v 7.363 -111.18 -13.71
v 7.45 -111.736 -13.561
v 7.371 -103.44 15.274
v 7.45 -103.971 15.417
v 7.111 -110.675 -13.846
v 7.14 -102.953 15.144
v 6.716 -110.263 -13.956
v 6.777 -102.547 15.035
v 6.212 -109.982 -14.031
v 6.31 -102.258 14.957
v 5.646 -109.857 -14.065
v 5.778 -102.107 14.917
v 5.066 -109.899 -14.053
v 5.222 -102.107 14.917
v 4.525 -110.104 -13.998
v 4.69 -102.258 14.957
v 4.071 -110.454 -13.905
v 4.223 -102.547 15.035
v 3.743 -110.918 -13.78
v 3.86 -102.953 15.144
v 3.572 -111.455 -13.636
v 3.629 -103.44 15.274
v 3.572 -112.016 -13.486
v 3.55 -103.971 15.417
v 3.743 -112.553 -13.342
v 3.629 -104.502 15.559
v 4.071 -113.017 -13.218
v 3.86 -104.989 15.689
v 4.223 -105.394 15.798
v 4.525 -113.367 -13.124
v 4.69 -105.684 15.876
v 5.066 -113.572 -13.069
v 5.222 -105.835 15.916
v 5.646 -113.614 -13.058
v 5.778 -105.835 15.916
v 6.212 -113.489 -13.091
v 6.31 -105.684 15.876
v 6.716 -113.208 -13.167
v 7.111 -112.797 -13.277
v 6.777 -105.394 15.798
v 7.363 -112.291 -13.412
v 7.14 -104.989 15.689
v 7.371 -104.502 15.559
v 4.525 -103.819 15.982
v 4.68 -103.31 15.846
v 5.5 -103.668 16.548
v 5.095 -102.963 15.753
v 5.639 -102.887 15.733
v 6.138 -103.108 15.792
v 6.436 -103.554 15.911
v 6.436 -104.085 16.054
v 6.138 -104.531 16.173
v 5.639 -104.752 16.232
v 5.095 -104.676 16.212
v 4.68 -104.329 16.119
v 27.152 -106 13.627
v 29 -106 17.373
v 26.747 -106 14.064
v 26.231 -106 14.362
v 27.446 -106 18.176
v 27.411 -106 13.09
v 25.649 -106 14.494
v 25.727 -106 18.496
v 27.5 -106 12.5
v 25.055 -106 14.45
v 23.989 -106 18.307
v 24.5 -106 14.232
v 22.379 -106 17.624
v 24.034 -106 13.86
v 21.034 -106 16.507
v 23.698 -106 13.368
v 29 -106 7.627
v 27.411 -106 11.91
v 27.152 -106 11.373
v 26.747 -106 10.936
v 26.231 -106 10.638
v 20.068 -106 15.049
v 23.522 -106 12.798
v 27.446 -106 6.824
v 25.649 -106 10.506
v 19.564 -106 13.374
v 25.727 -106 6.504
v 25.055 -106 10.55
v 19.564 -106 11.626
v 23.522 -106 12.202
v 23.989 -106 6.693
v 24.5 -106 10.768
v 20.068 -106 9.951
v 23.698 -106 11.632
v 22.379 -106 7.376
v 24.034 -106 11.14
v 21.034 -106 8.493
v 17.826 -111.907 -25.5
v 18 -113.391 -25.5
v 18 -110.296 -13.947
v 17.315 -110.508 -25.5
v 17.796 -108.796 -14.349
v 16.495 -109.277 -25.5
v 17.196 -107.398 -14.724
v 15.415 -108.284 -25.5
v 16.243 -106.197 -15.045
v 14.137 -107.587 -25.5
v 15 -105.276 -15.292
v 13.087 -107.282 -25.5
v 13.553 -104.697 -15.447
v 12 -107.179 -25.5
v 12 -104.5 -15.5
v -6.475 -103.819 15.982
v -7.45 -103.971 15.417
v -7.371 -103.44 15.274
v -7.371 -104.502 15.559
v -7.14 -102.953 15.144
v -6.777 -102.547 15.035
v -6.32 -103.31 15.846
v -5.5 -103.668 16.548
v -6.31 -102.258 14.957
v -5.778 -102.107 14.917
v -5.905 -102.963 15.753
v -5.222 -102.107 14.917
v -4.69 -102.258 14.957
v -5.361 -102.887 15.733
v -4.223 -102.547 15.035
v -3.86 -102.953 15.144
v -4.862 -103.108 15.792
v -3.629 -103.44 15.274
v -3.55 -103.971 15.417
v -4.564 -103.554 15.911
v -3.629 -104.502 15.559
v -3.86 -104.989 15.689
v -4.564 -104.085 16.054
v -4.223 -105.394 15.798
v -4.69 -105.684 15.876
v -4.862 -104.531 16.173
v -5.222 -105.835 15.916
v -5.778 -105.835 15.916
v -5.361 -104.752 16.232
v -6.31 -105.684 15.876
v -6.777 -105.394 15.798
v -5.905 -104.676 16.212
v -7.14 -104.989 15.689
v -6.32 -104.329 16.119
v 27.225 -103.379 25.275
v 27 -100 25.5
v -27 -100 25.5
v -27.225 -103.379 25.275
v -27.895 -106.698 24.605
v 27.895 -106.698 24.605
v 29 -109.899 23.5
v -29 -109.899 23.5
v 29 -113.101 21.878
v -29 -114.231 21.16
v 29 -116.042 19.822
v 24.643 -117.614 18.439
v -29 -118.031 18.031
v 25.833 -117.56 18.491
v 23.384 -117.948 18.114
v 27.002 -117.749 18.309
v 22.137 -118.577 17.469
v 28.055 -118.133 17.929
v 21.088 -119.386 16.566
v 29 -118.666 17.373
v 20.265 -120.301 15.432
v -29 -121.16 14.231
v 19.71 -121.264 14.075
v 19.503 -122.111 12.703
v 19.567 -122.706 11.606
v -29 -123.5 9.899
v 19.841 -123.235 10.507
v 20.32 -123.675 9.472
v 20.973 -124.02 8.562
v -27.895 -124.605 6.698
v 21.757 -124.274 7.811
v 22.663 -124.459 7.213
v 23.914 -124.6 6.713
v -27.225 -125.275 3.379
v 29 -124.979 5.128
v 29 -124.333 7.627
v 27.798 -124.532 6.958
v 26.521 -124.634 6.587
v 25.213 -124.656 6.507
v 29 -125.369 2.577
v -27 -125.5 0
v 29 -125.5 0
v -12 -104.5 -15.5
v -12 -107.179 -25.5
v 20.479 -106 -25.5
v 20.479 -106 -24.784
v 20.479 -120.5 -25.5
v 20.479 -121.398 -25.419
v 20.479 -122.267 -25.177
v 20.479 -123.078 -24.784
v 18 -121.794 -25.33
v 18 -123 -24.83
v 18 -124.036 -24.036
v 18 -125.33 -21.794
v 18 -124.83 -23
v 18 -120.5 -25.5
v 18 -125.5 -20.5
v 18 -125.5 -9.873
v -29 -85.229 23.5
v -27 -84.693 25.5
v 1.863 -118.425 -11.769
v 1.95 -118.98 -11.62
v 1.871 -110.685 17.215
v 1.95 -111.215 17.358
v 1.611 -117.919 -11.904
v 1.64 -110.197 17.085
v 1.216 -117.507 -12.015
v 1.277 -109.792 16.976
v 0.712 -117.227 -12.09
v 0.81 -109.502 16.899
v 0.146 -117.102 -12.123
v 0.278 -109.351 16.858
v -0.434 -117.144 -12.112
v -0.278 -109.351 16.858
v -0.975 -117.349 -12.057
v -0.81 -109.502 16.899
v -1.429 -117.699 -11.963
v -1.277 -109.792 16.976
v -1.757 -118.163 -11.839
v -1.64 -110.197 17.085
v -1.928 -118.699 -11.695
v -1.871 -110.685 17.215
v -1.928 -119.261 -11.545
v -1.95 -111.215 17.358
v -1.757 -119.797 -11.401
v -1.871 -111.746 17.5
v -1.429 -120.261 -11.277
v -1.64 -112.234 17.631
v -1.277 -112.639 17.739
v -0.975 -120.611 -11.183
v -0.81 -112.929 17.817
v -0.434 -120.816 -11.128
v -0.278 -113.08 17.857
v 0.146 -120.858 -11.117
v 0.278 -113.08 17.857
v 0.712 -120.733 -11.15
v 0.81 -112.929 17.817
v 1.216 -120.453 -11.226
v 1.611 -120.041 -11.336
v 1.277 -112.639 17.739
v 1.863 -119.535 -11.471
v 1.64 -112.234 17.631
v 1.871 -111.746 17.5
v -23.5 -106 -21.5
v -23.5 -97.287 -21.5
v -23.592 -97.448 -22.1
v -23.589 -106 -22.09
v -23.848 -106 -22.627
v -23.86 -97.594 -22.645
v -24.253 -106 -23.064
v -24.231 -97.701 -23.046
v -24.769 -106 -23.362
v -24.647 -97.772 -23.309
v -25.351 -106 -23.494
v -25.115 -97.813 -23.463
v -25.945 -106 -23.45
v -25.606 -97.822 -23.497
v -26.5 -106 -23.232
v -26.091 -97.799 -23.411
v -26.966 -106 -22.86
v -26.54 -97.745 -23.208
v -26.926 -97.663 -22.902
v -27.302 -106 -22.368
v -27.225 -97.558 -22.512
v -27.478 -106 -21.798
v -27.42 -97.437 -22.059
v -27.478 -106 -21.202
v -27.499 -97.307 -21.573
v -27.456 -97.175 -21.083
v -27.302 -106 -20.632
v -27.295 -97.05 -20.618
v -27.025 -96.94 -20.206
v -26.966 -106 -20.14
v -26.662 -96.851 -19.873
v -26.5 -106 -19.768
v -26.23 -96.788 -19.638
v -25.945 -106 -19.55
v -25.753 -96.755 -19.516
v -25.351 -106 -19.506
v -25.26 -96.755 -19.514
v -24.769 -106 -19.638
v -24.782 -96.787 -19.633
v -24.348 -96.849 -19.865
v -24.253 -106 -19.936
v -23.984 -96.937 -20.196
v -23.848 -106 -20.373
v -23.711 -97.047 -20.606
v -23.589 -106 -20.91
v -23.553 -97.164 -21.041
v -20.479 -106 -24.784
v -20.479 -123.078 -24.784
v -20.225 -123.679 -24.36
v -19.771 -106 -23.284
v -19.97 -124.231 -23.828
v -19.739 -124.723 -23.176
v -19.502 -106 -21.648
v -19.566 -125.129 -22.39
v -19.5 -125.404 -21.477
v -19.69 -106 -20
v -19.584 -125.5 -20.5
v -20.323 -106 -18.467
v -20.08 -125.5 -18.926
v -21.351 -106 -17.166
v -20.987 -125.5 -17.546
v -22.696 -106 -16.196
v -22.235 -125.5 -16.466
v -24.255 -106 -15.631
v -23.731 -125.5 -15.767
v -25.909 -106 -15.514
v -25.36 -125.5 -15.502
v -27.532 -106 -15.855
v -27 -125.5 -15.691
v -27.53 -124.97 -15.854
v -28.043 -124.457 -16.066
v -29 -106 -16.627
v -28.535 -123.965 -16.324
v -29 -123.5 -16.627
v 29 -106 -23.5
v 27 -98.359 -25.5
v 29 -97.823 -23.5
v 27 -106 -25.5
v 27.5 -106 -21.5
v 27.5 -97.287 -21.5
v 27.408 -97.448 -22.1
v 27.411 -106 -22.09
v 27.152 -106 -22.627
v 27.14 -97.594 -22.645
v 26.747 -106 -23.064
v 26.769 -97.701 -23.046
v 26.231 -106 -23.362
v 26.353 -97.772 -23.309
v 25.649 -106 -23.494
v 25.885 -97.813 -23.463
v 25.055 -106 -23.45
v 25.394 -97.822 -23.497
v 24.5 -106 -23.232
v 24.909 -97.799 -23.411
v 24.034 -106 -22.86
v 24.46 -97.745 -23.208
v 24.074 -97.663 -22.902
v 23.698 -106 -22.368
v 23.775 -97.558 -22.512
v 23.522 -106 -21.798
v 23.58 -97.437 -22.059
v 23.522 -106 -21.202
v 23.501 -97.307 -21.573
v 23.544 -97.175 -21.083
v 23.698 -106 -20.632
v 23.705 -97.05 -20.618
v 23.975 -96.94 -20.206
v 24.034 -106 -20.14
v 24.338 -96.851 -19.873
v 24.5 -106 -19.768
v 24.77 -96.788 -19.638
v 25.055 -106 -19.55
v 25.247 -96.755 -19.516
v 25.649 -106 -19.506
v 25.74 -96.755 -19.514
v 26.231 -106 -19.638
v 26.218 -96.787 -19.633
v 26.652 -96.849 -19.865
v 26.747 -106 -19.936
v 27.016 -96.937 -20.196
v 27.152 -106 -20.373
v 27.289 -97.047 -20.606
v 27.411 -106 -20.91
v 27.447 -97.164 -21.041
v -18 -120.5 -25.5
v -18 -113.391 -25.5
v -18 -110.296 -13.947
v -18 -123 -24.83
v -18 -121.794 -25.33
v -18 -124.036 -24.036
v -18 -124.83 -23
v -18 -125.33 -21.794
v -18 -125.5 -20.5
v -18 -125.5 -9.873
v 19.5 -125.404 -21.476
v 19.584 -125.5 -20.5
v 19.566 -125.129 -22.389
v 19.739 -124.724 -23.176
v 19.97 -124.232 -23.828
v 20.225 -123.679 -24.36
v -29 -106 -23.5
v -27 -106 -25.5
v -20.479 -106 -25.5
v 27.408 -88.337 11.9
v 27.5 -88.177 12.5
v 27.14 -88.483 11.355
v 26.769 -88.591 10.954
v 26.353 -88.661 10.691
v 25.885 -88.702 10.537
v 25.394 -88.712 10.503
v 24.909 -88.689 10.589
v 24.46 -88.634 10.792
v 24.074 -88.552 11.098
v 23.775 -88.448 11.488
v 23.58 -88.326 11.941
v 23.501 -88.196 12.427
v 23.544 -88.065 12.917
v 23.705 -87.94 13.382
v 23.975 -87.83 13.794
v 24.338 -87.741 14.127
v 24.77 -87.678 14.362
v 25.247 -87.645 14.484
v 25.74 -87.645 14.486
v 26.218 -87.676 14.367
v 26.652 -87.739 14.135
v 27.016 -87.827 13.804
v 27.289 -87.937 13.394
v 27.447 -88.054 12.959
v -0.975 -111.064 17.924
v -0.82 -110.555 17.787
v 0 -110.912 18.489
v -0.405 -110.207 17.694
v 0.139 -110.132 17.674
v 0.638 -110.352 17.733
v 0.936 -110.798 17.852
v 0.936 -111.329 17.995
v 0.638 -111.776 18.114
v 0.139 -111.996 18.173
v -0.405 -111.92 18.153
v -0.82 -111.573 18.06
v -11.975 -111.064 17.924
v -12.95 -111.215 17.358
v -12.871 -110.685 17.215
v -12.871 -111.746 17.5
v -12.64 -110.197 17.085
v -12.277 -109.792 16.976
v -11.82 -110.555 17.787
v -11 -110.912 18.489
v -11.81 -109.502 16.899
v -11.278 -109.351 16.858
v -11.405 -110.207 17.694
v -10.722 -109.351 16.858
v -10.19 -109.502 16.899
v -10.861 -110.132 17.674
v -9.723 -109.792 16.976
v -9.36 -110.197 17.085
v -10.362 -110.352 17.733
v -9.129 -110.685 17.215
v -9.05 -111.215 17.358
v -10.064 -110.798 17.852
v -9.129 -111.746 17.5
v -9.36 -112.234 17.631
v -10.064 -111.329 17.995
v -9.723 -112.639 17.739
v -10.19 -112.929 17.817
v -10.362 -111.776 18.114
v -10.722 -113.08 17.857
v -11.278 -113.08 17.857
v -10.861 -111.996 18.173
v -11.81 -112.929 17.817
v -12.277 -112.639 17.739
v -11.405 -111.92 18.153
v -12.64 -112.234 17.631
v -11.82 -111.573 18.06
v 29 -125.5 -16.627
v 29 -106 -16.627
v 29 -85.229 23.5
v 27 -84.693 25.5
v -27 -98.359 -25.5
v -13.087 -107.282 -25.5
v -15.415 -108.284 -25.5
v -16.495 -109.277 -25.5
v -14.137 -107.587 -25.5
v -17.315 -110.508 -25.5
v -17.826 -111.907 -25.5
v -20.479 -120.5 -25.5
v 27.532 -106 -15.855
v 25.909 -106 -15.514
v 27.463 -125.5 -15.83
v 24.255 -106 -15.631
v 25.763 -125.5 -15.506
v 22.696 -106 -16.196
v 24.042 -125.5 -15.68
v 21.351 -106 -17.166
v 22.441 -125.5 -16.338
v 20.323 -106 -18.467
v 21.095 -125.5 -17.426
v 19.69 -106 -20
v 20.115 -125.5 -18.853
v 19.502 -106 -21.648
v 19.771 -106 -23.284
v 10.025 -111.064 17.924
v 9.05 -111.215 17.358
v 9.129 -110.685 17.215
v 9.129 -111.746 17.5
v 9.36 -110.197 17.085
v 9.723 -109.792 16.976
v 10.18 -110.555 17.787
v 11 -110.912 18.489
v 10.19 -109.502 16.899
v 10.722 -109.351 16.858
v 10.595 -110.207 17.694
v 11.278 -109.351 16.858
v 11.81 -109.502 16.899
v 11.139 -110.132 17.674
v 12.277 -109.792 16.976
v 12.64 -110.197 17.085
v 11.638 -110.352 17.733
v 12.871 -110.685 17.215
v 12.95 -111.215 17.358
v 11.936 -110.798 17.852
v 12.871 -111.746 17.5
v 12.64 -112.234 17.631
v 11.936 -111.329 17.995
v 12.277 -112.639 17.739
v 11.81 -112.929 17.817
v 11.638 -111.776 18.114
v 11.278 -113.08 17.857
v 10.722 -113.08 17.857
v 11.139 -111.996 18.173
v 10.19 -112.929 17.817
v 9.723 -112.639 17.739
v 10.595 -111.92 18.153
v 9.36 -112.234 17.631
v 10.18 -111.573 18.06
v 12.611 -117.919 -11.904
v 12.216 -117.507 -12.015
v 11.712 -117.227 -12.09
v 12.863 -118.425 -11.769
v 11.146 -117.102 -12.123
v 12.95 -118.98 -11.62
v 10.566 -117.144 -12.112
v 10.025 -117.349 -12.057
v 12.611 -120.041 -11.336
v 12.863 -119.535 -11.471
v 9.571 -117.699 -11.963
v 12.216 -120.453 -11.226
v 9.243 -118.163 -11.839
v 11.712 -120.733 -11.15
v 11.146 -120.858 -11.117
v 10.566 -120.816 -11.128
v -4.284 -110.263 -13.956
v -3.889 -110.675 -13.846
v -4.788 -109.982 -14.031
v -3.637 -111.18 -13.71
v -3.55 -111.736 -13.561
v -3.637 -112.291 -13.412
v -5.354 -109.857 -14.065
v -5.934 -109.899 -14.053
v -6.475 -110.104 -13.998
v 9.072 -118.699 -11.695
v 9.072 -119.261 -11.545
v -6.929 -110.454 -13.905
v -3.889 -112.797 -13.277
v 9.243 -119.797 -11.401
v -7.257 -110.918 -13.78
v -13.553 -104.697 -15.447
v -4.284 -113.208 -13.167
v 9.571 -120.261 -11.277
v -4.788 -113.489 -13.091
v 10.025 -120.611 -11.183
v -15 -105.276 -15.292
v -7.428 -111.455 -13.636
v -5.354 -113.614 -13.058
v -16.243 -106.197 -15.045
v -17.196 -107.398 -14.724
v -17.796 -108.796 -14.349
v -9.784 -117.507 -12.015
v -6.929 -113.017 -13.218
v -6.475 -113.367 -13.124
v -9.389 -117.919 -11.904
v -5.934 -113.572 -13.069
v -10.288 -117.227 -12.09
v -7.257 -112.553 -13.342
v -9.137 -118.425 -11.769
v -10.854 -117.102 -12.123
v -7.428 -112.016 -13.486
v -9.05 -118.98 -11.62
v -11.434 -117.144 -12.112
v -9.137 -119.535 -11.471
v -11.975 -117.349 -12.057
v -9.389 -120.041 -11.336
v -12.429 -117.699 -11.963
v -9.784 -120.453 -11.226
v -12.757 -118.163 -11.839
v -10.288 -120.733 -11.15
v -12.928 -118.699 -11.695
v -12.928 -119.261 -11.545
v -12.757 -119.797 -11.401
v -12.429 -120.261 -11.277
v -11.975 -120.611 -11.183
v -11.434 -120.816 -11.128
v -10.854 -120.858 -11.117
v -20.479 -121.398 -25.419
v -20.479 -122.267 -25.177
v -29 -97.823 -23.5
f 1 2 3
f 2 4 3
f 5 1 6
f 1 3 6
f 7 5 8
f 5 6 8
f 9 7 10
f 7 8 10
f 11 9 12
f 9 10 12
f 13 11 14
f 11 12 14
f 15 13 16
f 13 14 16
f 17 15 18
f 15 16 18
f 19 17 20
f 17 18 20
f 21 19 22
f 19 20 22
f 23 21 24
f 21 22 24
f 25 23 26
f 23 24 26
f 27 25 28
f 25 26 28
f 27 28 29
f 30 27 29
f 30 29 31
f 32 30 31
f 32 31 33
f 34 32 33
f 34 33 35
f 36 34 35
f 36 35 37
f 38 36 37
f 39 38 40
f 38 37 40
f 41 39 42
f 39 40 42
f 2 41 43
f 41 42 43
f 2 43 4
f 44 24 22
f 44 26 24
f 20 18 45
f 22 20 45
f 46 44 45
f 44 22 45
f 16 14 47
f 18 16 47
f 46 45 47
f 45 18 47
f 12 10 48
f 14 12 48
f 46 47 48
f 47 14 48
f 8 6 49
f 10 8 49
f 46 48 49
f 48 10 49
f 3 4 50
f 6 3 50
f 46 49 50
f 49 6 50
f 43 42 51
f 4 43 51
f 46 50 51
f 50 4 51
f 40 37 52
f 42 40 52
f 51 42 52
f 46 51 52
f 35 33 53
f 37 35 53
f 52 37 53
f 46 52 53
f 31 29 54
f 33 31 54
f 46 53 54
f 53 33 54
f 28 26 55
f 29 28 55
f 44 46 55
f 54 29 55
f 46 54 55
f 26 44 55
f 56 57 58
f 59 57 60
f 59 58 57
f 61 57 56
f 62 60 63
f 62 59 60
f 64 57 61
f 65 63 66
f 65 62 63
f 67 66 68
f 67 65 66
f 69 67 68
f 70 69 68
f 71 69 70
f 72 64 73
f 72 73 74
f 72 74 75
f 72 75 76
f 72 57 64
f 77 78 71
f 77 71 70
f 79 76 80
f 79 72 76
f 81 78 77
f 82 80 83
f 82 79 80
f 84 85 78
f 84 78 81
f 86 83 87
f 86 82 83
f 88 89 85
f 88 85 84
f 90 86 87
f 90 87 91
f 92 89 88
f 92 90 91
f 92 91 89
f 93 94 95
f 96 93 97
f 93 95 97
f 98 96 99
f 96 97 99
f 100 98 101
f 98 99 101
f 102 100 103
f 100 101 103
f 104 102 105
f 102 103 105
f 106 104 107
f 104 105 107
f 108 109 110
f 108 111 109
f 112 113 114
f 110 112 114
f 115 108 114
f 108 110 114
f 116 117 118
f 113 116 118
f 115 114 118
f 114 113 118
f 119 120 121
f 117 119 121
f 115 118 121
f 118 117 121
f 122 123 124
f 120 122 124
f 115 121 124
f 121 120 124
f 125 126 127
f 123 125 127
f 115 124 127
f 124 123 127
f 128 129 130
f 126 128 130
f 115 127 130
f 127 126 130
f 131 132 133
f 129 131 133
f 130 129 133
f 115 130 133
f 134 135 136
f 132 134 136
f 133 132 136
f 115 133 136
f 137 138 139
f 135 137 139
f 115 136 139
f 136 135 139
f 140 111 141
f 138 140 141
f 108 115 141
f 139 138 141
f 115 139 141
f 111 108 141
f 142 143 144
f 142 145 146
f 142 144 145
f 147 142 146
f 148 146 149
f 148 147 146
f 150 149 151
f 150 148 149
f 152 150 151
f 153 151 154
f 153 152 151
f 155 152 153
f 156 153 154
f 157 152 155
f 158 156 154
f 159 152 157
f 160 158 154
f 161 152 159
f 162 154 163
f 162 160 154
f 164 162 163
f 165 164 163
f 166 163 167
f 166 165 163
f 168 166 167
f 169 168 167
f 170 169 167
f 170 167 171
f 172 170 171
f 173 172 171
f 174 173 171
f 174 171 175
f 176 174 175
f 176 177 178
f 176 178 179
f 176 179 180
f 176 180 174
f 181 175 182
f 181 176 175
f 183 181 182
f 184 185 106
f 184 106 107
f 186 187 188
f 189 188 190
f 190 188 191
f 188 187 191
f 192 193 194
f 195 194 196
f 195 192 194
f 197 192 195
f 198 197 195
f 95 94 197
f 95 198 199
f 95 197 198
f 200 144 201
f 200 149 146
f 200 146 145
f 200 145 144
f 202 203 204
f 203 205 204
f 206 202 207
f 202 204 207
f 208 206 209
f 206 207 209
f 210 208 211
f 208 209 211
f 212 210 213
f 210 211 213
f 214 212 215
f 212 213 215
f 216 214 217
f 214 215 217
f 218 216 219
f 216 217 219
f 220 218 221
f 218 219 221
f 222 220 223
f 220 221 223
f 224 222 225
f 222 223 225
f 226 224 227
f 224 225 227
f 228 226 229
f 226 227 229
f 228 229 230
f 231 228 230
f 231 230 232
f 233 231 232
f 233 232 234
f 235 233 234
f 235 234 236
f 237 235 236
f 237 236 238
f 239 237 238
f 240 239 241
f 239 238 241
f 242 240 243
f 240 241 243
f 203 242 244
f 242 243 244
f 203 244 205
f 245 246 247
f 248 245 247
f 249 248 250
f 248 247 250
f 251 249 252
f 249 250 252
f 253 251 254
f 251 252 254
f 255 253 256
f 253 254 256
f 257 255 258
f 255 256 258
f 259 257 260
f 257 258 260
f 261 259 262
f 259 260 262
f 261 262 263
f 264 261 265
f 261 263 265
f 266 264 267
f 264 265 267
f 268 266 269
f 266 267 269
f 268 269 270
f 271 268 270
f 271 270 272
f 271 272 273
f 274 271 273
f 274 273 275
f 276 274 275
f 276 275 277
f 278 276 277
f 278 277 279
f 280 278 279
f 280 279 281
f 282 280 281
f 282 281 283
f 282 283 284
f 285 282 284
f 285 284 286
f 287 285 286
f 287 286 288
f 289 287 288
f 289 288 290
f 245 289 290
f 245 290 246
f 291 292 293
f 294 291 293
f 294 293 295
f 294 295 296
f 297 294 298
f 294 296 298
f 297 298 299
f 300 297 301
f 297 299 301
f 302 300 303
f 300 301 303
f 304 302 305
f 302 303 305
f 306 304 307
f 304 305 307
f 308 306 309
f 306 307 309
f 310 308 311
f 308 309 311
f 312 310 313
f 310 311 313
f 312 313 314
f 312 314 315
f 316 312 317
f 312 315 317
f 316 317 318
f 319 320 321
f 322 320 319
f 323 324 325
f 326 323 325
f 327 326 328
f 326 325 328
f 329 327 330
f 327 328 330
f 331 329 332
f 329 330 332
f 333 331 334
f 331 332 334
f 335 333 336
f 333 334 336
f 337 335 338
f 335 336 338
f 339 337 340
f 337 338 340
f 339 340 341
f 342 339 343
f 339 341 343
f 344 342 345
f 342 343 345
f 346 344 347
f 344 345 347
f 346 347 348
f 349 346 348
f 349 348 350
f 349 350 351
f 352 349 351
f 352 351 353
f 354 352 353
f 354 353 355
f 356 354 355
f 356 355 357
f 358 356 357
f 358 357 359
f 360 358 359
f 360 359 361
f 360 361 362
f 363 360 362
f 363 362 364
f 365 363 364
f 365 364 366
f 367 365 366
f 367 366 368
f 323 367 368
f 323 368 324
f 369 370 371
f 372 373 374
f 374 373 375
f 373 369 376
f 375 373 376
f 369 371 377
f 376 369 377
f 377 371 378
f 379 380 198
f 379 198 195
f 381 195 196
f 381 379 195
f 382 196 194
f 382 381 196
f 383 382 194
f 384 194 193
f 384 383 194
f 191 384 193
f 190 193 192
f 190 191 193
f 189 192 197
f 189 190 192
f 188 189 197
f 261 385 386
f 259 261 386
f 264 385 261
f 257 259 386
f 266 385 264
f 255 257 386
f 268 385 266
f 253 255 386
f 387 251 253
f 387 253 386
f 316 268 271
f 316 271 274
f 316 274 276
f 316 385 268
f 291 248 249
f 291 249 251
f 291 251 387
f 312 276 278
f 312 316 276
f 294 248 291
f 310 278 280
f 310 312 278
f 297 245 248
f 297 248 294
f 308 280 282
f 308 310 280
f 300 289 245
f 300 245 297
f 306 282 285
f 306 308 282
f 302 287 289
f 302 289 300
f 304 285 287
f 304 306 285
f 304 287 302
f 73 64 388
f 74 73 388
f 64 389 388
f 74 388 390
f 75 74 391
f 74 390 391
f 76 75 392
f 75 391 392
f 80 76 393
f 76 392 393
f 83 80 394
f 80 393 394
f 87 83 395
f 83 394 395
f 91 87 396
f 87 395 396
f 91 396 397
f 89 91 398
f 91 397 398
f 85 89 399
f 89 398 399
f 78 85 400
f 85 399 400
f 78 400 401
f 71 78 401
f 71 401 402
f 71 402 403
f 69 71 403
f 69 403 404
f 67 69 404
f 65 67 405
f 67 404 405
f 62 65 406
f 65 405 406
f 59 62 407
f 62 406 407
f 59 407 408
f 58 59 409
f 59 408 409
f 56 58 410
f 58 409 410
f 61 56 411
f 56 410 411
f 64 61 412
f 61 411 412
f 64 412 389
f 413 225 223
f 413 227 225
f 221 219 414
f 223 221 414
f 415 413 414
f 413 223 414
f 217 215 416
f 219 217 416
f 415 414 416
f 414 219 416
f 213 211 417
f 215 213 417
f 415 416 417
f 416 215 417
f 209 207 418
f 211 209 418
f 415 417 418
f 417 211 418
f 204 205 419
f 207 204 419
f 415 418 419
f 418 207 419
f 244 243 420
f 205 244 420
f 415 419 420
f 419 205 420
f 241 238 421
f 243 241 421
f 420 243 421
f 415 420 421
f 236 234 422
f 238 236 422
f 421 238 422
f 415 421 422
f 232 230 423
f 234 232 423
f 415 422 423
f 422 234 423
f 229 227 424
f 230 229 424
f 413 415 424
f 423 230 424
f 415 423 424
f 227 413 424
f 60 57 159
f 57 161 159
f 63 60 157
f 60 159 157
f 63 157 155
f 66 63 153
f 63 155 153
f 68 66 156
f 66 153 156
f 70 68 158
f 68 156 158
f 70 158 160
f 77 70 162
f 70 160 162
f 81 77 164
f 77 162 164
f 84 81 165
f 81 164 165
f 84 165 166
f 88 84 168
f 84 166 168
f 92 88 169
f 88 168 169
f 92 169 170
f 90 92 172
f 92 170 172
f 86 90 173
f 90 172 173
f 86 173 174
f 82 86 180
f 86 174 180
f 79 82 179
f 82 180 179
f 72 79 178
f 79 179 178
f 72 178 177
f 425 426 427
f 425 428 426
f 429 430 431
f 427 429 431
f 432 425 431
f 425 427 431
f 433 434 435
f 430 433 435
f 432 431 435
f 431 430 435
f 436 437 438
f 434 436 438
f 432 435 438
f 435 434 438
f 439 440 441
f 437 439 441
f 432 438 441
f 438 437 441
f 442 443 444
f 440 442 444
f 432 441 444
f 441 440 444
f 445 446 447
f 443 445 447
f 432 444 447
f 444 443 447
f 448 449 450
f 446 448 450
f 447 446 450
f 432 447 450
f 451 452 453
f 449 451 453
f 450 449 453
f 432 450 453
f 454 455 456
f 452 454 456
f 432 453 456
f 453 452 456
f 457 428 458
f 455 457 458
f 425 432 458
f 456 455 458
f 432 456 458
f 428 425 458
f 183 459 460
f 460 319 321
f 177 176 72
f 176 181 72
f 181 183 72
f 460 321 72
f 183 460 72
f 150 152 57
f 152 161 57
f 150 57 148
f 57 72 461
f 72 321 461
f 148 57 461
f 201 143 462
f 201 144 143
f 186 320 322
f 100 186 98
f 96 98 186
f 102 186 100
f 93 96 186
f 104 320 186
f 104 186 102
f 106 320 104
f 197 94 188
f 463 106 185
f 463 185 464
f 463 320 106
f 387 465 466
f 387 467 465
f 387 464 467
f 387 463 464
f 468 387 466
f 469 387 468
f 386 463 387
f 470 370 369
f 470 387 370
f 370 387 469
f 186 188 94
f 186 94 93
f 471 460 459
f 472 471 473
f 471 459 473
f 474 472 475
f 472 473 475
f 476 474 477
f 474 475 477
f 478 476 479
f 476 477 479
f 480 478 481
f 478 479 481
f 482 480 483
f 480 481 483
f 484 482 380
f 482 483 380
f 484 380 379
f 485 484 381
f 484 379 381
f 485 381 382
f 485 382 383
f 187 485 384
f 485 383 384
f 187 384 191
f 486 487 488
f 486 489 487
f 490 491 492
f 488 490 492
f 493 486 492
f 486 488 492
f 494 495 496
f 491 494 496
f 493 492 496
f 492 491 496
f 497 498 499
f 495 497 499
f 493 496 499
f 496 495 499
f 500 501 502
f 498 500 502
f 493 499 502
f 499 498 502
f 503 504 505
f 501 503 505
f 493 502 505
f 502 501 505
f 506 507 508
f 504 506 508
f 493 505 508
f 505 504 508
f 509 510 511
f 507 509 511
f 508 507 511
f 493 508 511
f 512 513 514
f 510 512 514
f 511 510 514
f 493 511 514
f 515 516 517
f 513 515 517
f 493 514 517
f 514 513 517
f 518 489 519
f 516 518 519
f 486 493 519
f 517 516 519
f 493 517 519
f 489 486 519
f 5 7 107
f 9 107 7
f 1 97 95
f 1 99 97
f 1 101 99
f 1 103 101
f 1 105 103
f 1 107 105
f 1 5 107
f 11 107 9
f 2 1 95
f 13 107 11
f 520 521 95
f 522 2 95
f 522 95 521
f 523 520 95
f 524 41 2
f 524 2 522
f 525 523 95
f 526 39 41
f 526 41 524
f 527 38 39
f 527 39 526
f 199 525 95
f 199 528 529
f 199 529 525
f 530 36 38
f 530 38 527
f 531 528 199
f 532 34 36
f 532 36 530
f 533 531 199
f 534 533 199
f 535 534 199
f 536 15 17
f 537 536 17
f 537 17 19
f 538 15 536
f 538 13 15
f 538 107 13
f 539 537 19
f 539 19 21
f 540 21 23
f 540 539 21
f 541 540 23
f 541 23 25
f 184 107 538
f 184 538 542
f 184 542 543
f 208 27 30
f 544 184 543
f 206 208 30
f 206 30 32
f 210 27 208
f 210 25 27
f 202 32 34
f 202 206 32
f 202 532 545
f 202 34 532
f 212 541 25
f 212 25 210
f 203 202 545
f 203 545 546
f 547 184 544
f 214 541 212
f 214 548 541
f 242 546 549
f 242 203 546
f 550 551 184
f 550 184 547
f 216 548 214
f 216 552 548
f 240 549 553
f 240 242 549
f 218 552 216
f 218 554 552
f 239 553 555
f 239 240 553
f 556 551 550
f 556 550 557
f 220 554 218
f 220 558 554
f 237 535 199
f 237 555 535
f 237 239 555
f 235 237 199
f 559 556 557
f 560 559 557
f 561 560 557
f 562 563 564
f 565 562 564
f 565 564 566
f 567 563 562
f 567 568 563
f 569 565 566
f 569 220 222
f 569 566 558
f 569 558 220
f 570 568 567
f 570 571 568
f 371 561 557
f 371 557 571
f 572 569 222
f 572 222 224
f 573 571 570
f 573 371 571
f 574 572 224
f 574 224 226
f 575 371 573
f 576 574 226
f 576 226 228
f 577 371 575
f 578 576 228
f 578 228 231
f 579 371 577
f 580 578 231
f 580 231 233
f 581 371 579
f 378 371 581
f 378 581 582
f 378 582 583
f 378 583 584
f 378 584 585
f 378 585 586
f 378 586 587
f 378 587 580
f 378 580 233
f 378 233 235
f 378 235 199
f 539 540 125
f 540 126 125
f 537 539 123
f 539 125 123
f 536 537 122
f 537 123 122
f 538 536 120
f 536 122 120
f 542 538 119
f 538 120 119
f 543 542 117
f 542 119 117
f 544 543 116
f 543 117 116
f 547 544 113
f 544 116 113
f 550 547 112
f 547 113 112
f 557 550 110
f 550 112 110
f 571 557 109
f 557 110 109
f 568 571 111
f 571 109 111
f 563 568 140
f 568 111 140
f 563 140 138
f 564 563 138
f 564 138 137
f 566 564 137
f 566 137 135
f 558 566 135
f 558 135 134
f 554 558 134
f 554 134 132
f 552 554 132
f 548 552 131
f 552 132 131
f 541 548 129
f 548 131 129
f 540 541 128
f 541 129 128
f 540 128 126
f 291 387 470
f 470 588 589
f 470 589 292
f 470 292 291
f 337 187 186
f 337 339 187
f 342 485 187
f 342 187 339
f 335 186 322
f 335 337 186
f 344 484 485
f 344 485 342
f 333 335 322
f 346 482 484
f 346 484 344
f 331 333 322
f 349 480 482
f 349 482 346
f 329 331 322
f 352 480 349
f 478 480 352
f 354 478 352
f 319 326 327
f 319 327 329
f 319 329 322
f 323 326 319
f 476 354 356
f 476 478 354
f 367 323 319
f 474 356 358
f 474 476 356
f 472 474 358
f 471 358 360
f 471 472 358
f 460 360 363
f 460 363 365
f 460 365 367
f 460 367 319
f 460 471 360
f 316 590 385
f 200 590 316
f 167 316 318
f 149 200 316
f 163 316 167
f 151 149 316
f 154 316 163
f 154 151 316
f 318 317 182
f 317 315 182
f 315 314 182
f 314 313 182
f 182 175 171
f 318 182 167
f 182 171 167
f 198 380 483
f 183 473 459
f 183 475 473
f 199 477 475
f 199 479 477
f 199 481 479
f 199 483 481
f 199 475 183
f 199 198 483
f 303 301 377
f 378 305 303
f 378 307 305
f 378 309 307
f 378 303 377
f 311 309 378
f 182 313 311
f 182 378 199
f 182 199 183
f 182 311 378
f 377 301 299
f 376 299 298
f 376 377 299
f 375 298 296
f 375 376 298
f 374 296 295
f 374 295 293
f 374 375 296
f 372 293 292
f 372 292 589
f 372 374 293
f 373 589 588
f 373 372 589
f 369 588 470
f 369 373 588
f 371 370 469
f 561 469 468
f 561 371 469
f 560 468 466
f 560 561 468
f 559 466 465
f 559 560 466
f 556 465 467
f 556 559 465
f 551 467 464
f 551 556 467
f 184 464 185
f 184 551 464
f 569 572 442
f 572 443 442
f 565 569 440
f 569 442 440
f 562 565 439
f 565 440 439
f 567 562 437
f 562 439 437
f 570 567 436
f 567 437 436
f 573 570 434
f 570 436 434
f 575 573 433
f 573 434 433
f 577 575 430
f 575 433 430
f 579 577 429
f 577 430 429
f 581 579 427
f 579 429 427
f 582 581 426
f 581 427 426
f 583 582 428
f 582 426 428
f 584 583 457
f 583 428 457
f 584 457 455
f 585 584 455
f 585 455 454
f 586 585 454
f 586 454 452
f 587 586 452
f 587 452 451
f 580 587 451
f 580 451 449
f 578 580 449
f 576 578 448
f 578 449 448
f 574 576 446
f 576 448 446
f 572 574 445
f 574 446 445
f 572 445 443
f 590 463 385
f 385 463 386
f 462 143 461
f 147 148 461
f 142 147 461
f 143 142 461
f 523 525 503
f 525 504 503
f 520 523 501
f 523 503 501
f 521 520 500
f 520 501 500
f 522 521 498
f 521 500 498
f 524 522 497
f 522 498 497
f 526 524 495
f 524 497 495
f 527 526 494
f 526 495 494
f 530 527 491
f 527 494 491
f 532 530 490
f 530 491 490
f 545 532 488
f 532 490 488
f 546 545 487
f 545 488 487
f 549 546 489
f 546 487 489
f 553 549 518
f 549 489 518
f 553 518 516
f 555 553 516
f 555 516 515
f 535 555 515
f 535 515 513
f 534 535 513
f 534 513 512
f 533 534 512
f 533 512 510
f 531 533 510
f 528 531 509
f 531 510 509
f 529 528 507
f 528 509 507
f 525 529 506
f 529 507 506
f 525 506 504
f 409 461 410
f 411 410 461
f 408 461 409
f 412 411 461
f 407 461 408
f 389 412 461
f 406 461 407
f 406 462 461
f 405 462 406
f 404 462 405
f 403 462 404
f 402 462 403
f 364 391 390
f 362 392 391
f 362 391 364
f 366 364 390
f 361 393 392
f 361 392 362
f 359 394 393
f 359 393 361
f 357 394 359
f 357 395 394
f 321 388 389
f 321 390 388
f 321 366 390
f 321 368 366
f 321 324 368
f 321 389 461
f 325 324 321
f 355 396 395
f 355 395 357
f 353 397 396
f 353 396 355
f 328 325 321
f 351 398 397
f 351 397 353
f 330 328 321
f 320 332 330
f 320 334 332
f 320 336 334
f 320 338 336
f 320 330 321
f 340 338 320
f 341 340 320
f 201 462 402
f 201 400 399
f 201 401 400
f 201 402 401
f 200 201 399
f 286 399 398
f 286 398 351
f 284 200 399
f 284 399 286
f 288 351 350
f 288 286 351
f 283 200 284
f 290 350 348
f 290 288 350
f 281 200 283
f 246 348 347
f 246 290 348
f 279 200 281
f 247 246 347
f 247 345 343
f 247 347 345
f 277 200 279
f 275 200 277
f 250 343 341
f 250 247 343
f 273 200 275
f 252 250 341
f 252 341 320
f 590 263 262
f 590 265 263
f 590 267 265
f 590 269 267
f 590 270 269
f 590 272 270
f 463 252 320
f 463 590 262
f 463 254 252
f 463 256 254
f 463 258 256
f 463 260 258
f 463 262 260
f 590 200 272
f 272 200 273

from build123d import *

# Parameters (mm, degrees)
BOSS_EXTRUDE1_DEPTH                                = 11
BOSS_EXTRUDE2_DEPTH                                = 36
BOSS_EXTRUDE3_DEPTH                                = 11
CUT_EXTRUDE1_DEPTH                                 = 19.5
CUT_EXTRUDE2_DEPTH                                 = 19.5
F_3_9_3_9_DIAMETER_HOLE1_D                         = 3.9
F_3_9_3_9_DIAMETER_HOLE1_DEPTH                     = 30
F_3_9_3_9_DIAMETER_HOLE1_TIP                       = 1.171678207
CBORE_FOR_M3_5_HEX_HEAD_MACHINE_SCREW1_D           = 4
CBORE_FOR_M3_5_HEX_HEAD_MACHINE_SCREW1_DEPTH       = 40.80674334
CBORE_FOR_M3_5_HEX_HEAD_MACHINE_SCREW1_CBORE_D     = 12
CBORE_FOR_M3_5_HEX_HEAD_MACHINE_SCREW1_CBORE_DEPTH = 19.5
F_4_0_4_DIAMETER_HOLE1_D                           = 4
F_4_0_4_DIAMETER_HOLE1_DEPTH                       = 21.30674334
CHAMFER1_SIZE                                      = 2
FILLET4_R                                          = 5
FILLET5_R                                          = 6
CUT_EXTRUDE3_DEPTH                                 = 141.586272594


with BuildPart() as part:
    # Sketch1 → Boss-Extrude1 (new body)
    with BuildSketch(Plane(origin=(-29, 0, 0), x_dir=(0, -1, 0), z_dir=(-1, 0, 0))):
        Polygon((125.5, 25.5), (84.69325666, 25.5), (98.358665474, -25.5), (125.5, -25.5), align=None)
    extrude(amount=-BOSS_EXTRUDE1_DEPTH)

    # Sketch2 → Boss-Extrude2 (add)
    with BuildSketch(Plane(origin=(-18, 0, 0), x_dir=(0, 0, -1), z_dir=(1, 0, 0))):
        Polygon((25.5, -107.179491924), (15.5, -104.5), (9.873066959, -125.5), (-25.5, -125.5), (-25.5, -84.69325666), (25.5, -98.358665474), align=None)
    extrude(amount=BOSS_EXTRUDE2_DEPTH)

    # Sketch3 → Boss-Extrude3 (add)
    with BuildSketch(Plane(origin=(18, 0, 0), x_dir=(0, 0, -1), z_dir=(1, 0, 0))):
        Polygon((-25.5, -125.5), (-25.5, -84.69325666), (25.5, -98.358665474), (25.5, -125.5), align=None)
    extrude(amount=BOSS_EXTRUDE3_DEPTH)

    # Sketch4 → Cut-Extrude1 (cut)
    with BuildSketch(Plane.XZ.offset(125.5)):
        with BuildLine():
            Line((29, -25.5), (29, -16.626602828))
            ThreePointArc((29, -16.626602828), (21.350933194, -17.165805191), (20.478555895, -24.784067463))
            Line((20.478555895, -24.784067463), (20.478555895, -25.5))
            Line((20.478555895, -25.5), (29, -25.5))
        make_face()
    extrude(amount=-CUT_EXTRUDE1_DEPTH, mode=Mode.SUBTRACT)

    # Sketch5 → Cut-Extrude2 (cut)
    with BuildSketch(Plane.XZ.offset(125.5)):
        with BuildLine():
            Line((-20.478555895, -25.5), (-20.478555895, -24.784067463))
            ThreePointArc((-20.478555895, -24.784067463), (-21.350933194, -17.165805191), (-29, -16.626602828))
            Line((-29, -16.626602828), (-29, -25.5))
            Line((-29, -25.5), (-20.478555895, -25.5))
        make_face()
    extrude(amount=-CUT_EXTRUDE2_DEPTH, mode=Mode.SUBTRACT)

    # Ø3.9 (3.9) Diameter Hole1
    with Locations(Plane(origin=(0, -10.875172652, -40.586696879), x_dir=(-1, 0, 0), z_dir=(0, -0.25881904510251963, -0.9659258262890685))):
        with Locations((0, -111.918353437), (-11, -111.918353437), (-5.5, -104.418353437), (5.5, -104.418353437), (11, -111.918353437)):
            Hole(F_3_9_3_9_DIAMETER_HOLE1_D / 2, depth=F_3_9_3_9_DIAMETER_HOLE1_DEPTH)
            with Locations((0, 0, -(F_3_9_3_9_DIAMETER_HOLE1_DEPTH + F_3_9_3_9_DIAMETER_HOLE1_TIP / 2))):  # 118° drill point
                Cone(0, F_3_9_3_9_DIAMETER_HOLE1_D / 2, F_3_9_3_9_DIAMETER_HOLE1_TIP, mode=Mode.SUBTRACT)

    # CBORE for M3.5 Hex Head Machine Screw1
    with Locations(Plane(origin=(0, -125.5, 0), x_dir=(-1, 0, 0), z_dir=(0, -1, 0))):
        with Locations((-25.5, -12.5)):
            CounterBoreHole(CBORE_FOR_M3_5_HEX_HEAD_MACHINE_SCREW1_D / 2, CBORE_FOR_M3_5_HEX_HEAD_MACHINE_SCREW1_CBORE_D / 2, CBORE_FOR_M3_5_HEX_HEAD_MACHINE_SCREW1_CBORE_DEPTH, depth=CBORE_FOR_M3_5_HEX_HEAD_MACHINE_SCREW1_DEPTH)

    # Ø4.0 (4) Diameter Hole1
    with Locations(Plane(origin=(0, -106, 0), x_dir=(-1, 0, 0), z_dir=(0, -1, 0))):
        with Locations((25.5, 21.5), (-25.5, 21.5)):
            Hole(F_4_0_4_DIAMETER_HOLE1_D / 2, depth=F_4_0_4_DIAMETER_HOLE1_DEPTH)

    # Chamfer1
    chamfer1_edges = [part.edges().sort_by_distance(p)[0] for p in [
        (29, -105.09662833, 25.5),
        (29, -102.179332737, -25.5),
        (-29, -102.179332737, -25.5),
        (-29, -105.09662833, 25.5),
        (-29, -125.5, 4.436698586),
    ]]
    chamfer(chamfer1_edges, length=CHAMFER1_SIZE)

    # Fillet4
    fillet4_edges = [part.edges().sort_by_distance(p)[0] for p in [
        (19.239277947, -125.5, -25.5),
        (-19.239277947, -125.5, -25.5),
    ]]
    fillet(fillet4_edges, radius=FILLET4_R)

    # Fillet5
    fillet5_edges = [part.edges().sort_by_distance(p)[0] for p in [
        (-18, -105.839745962, -20.5),
        (18, -105.839745962, -20.5),
    ]]
    fillet(fillet5_edges, radius=FILLET5_R)

    # Sketch12 → Cut-Extrude3 (cut, through all)
    with BuildSketch(Plane(origin=(29, 0, 0), x_dir=(0, 0, -1), z_dir=(1, 0, 0))):
        with BuildLine():
            Line((0, -125.5), (-25.5, -125.5))
            Line((-25.5, -125.5), (-25.5, -100))
            ThreePointArc((-25.5, -100), (-18.03122292, -118.03122292), (0, -125.5))
        make_face()
    extrude(amount=-CUT_EXTRUDE3_DEPTH, mode=Mode.SUBTRACT)


solid = part.part
